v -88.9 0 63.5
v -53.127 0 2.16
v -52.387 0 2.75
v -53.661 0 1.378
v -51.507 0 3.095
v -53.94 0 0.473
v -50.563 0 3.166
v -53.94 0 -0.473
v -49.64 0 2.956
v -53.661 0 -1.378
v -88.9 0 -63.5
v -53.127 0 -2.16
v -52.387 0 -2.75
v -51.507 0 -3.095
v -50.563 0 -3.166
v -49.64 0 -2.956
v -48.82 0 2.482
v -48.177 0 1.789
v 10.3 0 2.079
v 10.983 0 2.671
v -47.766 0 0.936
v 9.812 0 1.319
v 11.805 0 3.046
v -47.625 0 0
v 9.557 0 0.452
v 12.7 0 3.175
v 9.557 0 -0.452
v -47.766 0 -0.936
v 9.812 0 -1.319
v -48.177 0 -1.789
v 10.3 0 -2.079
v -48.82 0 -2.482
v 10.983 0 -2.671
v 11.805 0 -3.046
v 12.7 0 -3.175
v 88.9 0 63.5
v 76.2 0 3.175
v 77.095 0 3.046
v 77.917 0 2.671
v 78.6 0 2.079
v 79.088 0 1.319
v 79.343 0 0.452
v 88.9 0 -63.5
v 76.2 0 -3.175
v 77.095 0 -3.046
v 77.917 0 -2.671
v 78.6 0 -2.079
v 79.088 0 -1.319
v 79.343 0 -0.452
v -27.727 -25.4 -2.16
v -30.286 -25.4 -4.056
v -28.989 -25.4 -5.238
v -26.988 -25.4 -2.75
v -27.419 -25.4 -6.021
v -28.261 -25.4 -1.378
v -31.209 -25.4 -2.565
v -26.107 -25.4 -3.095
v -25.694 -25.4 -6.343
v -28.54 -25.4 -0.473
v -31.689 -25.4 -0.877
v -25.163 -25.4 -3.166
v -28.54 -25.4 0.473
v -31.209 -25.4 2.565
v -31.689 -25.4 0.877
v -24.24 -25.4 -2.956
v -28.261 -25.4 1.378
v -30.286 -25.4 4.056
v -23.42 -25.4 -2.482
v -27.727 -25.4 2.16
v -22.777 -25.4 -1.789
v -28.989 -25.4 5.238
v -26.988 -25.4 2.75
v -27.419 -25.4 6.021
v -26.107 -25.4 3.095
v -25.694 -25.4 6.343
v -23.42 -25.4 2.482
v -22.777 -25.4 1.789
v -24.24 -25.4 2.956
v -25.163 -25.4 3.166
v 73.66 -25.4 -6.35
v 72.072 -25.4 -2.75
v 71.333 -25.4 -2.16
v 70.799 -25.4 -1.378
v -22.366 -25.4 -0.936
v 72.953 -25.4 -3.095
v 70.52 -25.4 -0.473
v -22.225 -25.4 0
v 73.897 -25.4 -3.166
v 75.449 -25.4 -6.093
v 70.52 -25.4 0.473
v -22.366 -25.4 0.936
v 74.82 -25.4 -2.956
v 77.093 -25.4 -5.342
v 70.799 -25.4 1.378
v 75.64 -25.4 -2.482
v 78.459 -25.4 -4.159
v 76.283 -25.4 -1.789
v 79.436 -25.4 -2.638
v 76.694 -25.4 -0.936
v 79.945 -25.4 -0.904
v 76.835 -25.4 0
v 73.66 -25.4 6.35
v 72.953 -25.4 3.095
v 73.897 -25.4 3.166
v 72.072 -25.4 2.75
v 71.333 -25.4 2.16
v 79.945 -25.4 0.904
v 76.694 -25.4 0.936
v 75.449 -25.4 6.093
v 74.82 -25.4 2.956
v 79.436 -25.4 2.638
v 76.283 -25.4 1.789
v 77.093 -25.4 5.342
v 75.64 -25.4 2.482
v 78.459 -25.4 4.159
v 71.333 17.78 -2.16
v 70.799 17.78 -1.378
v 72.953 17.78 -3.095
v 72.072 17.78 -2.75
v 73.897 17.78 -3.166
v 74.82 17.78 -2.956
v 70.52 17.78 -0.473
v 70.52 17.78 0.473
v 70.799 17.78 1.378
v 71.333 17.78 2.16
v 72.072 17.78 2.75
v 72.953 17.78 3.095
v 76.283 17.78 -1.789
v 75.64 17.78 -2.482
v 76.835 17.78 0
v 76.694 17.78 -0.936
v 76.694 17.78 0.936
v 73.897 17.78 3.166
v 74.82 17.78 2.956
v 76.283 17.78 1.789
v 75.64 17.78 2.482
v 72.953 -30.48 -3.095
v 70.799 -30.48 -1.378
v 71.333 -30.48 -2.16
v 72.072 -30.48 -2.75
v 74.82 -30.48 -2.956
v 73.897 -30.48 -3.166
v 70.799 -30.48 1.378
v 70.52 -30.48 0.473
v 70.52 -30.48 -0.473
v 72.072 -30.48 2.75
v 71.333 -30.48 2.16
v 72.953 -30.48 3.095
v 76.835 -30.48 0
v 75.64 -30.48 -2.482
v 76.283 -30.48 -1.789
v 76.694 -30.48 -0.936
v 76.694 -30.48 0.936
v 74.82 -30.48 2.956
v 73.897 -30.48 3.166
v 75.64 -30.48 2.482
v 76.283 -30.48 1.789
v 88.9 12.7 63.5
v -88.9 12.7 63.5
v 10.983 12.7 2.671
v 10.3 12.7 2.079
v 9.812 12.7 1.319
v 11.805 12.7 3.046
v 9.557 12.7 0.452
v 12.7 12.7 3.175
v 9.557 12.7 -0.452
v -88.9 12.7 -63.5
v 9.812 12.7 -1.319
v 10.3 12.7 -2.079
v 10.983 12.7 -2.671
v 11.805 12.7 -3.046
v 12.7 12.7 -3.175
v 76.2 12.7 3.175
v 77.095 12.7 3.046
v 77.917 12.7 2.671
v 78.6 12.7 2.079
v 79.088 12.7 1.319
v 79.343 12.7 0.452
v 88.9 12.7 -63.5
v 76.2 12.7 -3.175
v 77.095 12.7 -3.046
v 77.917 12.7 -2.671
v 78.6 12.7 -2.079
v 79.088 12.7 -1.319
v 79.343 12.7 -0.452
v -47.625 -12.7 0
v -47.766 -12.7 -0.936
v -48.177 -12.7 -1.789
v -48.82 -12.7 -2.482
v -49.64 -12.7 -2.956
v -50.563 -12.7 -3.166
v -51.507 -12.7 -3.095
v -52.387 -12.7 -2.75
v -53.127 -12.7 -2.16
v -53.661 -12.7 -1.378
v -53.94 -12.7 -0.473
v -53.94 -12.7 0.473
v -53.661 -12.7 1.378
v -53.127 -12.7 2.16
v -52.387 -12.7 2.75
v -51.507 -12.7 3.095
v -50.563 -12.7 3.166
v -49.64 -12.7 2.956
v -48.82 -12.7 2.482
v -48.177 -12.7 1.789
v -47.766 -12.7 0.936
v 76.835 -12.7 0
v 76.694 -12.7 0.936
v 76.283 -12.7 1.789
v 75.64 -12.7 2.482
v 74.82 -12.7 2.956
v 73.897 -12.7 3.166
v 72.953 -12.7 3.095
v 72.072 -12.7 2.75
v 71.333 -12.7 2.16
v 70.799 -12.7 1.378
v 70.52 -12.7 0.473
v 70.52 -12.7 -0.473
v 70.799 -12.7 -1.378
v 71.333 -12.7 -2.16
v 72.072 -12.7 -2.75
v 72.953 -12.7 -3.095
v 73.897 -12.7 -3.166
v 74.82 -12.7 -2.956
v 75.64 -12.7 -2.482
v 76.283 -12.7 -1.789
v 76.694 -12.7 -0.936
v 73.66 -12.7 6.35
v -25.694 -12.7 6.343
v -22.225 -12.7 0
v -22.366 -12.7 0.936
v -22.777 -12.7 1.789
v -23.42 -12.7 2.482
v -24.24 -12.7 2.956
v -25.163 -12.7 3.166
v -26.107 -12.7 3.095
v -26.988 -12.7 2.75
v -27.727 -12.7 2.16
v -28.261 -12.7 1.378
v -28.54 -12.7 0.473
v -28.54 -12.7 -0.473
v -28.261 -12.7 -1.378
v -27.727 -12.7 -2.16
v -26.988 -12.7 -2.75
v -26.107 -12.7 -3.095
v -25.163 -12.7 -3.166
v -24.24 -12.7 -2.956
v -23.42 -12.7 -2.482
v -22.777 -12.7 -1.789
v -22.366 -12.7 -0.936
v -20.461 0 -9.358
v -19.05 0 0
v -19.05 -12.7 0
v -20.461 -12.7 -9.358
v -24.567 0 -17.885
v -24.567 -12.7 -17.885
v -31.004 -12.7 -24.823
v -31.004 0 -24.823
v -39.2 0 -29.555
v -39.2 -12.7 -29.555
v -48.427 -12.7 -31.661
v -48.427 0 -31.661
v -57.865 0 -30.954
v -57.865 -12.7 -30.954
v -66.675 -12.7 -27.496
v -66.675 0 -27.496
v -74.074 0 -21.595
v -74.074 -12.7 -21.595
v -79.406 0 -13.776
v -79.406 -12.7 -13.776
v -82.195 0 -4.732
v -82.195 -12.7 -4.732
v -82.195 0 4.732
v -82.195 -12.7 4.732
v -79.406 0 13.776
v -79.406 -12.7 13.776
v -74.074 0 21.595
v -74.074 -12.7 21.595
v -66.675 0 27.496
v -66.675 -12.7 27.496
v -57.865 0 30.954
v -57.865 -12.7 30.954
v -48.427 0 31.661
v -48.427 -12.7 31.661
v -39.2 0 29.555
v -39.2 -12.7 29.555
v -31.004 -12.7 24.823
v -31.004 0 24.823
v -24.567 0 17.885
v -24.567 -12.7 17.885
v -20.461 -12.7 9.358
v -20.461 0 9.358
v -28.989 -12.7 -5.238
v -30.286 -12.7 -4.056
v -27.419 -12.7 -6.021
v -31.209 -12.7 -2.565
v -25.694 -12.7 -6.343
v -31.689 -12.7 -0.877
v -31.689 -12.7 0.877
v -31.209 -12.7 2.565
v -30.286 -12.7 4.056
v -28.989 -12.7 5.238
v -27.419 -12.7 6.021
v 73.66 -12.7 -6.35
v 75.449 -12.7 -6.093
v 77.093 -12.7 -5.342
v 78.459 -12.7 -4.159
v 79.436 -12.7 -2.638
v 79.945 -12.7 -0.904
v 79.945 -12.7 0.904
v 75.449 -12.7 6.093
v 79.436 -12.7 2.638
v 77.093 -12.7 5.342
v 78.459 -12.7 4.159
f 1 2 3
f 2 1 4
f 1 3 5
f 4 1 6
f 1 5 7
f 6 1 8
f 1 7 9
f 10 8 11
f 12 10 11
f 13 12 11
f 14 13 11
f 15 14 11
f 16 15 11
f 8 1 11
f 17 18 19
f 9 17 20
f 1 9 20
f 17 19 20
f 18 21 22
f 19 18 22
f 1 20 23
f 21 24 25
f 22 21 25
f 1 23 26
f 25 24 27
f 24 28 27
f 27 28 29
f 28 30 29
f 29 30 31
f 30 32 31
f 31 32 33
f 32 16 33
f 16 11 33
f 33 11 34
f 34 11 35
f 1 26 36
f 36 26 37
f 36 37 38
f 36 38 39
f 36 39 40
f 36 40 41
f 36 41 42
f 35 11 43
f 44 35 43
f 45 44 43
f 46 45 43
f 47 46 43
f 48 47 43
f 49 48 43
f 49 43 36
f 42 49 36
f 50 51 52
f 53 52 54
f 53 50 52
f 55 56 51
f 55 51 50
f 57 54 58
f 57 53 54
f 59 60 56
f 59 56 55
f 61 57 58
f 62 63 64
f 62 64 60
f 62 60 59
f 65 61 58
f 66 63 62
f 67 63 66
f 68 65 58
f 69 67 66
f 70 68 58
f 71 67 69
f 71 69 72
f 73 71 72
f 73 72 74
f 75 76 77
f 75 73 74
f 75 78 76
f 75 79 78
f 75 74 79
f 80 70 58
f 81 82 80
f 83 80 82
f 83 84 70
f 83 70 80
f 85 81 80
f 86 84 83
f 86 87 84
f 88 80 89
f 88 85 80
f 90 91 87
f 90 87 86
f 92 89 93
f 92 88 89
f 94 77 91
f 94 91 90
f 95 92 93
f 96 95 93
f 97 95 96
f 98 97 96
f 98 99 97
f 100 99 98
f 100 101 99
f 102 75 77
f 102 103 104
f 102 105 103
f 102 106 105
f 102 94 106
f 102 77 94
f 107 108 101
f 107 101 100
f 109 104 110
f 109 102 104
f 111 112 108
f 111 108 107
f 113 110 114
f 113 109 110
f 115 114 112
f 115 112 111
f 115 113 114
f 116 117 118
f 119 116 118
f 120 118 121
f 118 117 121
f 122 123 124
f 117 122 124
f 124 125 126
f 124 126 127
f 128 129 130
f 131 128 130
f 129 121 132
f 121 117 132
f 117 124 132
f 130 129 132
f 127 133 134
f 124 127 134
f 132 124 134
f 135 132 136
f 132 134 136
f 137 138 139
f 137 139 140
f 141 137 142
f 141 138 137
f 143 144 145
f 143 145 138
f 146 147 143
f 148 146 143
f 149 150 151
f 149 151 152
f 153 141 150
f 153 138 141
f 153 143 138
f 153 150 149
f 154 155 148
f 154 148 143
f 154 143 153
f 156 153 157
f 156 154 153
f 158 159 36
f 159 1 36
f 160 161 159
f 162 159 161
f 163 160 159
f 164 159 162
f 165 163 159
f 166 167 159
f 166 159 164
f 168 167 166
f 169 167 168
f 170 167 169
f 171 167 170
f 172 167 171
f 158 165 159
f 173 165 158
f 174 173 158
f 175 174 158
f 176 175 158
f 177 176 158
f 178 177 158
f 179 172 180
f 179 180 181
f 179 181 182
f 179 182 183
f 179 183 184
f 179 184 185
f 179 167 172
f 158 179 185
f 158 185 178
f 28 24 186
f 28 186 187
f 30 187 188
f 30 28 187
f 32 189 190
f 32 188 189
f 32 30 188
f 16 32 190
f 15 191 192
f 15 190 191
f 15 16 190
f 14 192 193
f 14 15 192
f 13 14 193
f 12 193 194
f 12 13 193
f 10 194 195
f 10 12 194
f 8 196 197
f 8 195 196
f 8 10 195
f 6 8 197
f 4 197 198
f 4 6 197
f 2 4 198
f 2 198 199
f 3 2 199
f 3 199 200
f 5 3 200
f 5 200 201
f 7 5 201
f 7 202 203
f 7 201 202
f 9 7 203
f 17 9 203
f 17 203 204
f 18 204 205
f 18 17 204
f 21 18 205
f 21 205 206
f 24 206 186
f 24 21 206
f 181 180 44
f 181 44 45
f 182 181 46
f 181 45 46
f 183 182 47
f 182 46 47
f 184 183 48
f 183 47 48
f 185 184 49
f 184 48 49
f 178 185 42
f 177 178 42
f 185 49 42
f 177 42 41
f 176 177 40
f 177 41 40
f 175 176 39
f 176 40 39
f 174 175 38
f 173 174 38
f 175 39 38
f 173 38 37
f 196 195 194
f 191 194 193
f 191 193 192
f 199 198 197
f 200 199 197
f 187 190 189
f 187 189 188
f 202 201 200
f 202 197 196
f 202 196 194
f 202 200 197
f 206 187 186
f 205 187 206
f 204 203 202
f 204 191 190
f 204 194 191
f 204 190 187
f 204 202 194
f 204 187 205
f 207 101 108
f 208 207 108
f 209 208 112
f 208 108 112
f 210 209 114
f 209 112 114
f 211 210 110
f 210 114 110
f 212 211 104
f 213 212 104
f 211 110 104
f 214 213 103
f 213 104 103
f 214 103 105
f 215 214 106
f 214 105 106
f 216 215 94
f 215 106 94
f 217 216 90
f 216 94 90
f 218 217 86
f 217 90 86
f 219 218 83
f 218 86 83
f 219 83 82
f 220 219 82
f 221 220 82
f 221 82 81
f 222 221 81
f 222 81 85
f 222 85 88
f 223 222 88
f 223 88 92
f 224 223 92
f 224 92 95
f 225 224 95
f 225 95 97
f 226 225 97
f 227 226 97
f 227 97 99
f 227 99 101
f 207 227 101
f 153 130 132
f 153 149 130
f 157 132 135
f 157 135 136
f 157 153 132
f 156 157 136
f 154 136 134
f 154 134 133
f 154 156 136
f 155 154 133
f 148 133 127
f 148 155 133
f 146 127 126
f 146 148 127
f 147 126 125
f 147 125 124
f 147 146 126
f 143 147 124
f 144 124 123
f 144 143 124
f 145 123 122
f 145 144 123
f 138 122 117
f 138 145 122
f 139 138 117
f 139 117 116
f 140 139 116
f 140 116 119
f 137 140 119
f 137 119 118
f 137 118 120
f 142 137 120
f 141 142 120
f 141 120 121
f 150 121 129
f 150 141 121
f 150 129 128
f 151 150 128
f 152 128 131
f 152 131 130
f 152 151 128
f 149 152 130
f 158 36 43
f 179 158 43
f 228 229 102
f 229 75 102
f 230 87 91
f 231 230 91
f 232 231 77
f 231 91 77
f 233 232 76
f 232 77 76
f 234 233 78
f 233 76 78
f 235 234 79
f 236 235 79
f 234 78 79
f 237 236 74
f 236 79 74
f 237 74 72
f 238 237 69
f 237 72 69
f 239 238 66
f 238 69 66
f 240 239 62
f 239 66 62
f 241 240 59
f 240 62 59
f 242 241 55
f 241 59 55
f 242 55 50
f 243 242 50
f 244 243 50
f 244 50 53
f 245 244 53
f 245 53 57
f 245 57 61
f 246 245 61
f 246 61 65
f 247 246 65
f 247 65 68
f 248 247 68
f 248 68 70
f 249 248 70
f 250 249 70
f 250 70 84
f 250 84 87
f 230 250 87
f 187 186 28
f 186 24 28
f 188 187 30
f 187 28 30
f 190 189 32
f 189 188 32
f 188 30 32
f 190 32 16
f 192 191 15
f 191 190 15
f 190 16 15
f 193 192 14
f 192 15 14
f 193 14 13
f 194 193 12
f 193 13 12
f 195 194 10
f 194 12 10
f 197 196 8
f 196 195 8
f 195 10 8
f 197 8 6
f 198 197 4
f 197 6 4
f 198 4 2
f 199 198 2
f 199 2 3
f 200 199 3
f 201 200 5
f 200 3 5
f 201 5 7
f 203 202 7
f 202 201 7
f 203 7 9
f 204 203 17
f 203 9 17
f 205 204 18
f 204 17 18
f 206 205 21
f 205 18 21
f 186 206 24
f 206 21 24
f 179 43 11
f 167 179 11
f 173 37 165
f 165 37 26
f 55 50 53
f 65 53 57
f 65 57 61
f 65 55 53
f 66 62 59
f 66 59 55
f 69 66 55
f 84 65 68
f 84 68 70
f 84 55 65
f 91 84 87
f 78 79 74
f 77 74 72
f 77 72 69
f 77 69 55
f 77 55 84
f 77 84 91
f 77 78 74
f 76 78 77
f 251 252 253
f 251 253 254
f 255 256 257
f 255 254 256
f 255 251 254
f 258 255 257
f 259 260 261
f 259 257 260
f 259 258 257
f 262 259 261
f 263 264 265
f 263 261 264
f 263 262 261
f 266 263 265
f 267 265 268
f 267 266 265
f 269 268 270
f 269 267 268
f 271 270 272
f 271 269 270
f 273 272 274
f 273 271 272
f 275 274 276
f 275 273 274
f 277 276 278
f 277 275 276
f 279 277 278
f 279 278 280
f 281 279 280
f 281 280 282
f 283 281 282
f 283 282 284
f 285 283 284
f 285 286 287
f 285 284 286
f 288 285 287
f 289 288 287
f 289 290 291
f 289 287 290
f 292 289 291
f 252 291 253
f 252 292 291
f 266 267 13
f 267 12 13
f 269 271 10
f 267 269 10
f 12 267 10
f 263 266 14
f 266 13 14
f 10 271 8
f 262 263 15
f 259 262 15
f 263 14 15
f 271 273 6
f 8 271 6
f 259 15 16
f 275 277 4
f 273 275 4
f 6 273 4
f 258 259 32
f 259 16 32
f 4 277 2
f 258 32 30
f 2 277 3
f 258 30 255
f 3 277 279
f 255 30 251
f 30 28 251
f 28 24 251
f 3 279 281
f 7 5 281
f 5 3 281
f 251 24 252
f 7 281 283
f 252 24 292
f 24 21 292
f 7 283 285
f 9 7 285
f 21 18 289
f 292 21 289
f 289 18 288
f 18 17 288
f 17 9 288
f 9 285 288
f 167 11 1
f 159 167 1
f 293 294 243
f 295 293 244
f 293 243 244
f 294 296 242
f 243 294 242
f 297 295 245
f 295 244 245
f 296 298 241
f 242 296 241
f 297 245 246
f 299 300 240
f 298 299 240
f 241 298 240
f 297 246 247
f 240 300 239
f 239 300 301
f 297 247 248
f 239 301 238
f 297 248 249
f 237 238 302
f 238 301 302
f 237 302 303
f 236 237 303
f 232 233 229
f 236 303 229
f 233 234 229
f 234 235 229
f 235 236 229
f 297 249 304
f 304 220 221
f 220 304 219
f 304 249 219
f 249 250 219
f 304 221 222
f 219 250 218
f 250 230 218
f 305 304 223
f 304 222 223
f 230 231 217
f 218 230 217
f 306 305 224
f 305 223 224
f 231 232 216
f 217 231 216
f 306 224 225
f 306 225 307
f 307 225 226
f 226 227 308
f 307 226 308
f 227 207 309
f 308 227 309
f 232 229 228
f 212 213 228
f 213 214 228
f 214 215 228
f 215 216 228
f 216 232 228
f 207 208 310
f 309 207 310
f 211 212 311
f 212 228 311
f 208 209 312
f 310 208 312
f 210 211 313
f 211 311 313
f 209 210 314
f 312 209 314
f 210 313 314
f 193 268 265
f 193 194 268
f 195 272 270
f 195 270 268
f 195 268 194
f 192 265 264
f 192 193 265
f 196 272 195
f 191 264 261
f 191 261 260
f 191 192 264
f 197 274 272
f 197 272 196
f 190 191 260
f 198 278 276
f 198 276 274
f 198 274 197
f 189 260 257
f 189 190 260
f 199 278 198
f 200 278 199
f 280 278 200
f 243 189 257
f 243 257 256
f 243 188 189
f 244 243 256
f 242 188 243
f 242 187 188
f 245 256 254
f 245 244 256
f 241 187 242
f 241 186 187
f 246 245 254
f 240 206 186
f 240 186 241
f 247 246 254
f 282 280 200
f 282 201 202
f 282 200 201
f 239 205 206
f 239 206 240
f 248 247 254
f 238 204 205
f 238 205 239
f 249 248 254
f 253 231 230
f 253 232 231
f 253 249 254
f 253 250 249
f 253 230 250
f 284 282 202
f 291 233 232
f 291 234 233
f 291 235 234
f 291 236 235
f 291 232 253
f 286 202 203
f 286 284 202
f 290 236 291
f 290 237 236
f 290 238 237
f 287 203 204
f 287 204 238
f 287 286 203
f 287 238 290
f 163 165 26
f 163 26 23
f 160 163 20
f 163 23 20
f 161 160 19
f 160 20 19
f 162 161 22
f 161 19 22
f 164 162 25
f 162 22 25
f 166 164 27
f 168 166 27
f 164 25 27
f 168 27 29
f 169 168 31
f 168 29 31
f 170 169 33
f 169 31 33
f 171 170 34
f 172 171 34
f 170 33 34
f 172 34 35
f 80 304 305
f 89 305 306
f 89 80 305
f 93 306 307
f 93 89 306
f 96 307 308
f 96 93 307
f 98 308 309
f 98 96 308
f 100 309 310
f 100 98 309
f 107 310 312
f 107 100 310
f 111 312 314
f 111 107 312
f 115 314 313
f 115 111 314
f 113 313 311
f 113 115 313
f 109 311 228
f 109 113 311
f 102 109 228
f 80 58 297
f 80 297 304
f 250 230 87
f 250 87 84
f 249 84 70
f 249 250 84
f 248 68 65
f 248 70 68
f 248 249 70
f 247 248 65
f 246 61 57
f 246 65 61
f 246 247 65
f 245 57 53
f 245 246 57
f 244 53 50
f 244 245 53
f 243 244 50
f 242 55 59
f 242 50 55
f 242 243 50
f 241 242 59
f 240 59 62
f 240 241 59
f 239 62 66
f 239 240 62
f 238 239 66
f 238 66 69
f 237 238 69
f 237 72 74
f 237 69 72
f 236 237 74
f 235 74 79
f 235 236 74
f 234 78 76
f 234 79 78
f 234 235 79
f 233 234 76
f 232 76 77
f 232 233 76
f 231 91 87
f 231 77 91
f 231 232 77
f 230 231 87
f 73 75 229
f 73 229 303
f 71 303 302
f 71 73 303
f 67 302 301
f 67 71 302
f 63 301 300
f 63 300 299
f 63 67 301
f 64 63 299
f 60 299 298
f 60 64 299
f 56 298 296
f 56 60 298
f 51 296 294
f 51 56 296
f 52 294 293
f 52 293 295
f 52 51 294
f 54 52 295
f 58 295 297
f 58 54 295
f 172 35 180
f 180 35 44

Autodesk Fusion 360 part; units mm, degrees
sketch "Sketch1" plane through (0, 0, 0) normal (0, 1, 0) x (1, 0, 0)
  line L0 (88.9, 63.5) -> (-88.9, 63.5)
  line L1 (-88.9, 63.5) -> (-88.9, -63.5)
  line L2 (-88.9, -63.5) -> (88.9, -63.5)
  line L3 (88.9, -63.5) -> (88.9, 63.5)
  line L4 (88.9, 63.5) -> (-88.9, -63.5) construction
  line L5 (-88.9, 63.5) -> (88.9, -63.5) construction
extrude "Extrude1" add sketch "Sketch1" along normal blind 12.7 makes body 1 in component "Base"
sketch "Sketch2" plane through (0, 0, 0) normal (0, -1, 0) x (1, 0, 0)
  line L0 (88.9, -63.5) -> (88.9, 63.5)
  line L1 (88.9, 63.5) -> (-88.9, 63.5)
  line L2 (-88.9, 63.5) -> (-88.9, -63.5)
  line L3 (-88.9, -63.5) -> (88.9, -63.5)
  circle A0 centre (-50.8, 0) radius 3.175
  dimension "d3" = 6.35
extrude "Extrude2" add sketch "Sketch2" along normal blind 12.7 contours A0 bodies 1 in component "Base"
sketch "Sketch3" plane through (0, 0, 0) normal (0, -1, 0) x (1, 0, 0)
  circle A0 centre (-50.8, 0) radius 3.175
  line L0 (88.9, -63.5) -> (88.9, 63.5)
  line L1 (88.9, 63.5) -> (-88.9, 63.5)
  line L2 (-88.9, 63.5) -> (-88.9, -63.5)
  line L3 (-88.9, -63.5) -> (88.9, -63.5)
  circle A1 centre (-50.8, 0) radius 31.75
  dimension "d6" = 63.5
extrude "Extrude1'" add sketch "Sketch3" along normal blind 12.7 separate body contours A1 makes body 2 in component "Wheel"
sketch "Sketch4" plane through (0, -12.7, 0) normal (0, -1, 0) x (1, 0, 0)
  circle A0 centre (-50.8, 0) radius 3.175
  circle A1 centre (-50.8, 0) radius 31.75
  circle A2 centre (-25.4, 0) radius 3.175
  dimension "d9" = 6.35
extrude "Extrude2'" add sketch "Sketch4" along normal blind 12.7 contours A2 bodies 2 in component "Wheel"
sketch "Sketch5" plane through (0, 0, 0) normal (0, -1, 0) x (1, 0, 0)
  circle A0 centre (-50.8, 0) radius 3.175
  line L0 (88.9, -63.5) -> (88.9, 63.5)
  line L1 (88.9, 63.5) -> (-88.9, 63.5)
  line L2 (-88.9, 63.5) -> (-88.9, -63.5)
  line L3 (-88.9, -63.5) -> (88.9, -63.5)
  line L4 (12.7, -3.175) -> (76.2, -3.175)
  arc A1 (76.2, -3.175) -> (76.2, 3.175) centre (76.2, 0) ccw
  line L5 (76.2, 3.175) -> (12.7, 3.175)
  arc A2 (12.7, 3.175) -> (12.7, -3.175) centre (12.7, 0) ccw
  line L6 (12.7, 0) -> (76.2, 0) construction
  dimension "d12" = 6.35
extrude "Extrude3" cut sketch "Sketch5" against normal blind 12.7 contours L4 A1 L5 A2 bodies 1 in component "Base"
sketch "Sketch6" plane through (0, -25.4, 0) normal (0, -1, 0) x (1, 0, 0)
  circle A0 centre (-25.4, 0) radius 3.175
  circle A1 centre (73.66, 0) radius 3.175
  dimension "d15" = 6.35
extrude "Extrude1''" add sketch "Sketch6" along normal blind -43.18 and the other way blind -5.08 separate body contours A1 makes body 3 in component "Slide"
sketch "Sketch7" plane through (0, -25.4, 0) normal (0, -1, 0) x (1, 0, 0)
  circle A0 centre (-25.4, 0) radius 3.175
  circle A1 centre (-25.4, 0) radius 3.175
  circle A2 centre (73.66, 0) radius 3.175
  circle A3 centre (-25.4, 0) radius 6.35
  circle A4 centre (73.66, 0) radius 6.35
  line L0 (-25.6943, 6.3432) -> (73.6596, 6.35)
  line L1 (-25.6943, -6.3432) -> (73.6596, -6.35)
  dimension "d20" = 12.7
  dimension "d21" = 12.7
extrude "Extrude1'''" add sketch "Sketch7" against normal blind 12.7 separate body contours A3 L0 L1 | A3 A4 L0 L1 | A4 makes body 4 in component "Component"
component "Base" placed x (1, 0, 0) y (0, 1, 0) z (0, 0, 1) at (0, 0, 0)
component "Wheel" placed x (1, 0, 0) y (0, 1, 0) z (0, 0, 1) at (0, 0, 0)
component "Slide" placed x (1, 0, 0) y (0, 1, 0) z (0, 0, 1) at (0, 0, 0)
component "Component" placed x (1, 0, 0) y (0, 1, 0) z (0, 0, 1) at (0, 0, 0)
